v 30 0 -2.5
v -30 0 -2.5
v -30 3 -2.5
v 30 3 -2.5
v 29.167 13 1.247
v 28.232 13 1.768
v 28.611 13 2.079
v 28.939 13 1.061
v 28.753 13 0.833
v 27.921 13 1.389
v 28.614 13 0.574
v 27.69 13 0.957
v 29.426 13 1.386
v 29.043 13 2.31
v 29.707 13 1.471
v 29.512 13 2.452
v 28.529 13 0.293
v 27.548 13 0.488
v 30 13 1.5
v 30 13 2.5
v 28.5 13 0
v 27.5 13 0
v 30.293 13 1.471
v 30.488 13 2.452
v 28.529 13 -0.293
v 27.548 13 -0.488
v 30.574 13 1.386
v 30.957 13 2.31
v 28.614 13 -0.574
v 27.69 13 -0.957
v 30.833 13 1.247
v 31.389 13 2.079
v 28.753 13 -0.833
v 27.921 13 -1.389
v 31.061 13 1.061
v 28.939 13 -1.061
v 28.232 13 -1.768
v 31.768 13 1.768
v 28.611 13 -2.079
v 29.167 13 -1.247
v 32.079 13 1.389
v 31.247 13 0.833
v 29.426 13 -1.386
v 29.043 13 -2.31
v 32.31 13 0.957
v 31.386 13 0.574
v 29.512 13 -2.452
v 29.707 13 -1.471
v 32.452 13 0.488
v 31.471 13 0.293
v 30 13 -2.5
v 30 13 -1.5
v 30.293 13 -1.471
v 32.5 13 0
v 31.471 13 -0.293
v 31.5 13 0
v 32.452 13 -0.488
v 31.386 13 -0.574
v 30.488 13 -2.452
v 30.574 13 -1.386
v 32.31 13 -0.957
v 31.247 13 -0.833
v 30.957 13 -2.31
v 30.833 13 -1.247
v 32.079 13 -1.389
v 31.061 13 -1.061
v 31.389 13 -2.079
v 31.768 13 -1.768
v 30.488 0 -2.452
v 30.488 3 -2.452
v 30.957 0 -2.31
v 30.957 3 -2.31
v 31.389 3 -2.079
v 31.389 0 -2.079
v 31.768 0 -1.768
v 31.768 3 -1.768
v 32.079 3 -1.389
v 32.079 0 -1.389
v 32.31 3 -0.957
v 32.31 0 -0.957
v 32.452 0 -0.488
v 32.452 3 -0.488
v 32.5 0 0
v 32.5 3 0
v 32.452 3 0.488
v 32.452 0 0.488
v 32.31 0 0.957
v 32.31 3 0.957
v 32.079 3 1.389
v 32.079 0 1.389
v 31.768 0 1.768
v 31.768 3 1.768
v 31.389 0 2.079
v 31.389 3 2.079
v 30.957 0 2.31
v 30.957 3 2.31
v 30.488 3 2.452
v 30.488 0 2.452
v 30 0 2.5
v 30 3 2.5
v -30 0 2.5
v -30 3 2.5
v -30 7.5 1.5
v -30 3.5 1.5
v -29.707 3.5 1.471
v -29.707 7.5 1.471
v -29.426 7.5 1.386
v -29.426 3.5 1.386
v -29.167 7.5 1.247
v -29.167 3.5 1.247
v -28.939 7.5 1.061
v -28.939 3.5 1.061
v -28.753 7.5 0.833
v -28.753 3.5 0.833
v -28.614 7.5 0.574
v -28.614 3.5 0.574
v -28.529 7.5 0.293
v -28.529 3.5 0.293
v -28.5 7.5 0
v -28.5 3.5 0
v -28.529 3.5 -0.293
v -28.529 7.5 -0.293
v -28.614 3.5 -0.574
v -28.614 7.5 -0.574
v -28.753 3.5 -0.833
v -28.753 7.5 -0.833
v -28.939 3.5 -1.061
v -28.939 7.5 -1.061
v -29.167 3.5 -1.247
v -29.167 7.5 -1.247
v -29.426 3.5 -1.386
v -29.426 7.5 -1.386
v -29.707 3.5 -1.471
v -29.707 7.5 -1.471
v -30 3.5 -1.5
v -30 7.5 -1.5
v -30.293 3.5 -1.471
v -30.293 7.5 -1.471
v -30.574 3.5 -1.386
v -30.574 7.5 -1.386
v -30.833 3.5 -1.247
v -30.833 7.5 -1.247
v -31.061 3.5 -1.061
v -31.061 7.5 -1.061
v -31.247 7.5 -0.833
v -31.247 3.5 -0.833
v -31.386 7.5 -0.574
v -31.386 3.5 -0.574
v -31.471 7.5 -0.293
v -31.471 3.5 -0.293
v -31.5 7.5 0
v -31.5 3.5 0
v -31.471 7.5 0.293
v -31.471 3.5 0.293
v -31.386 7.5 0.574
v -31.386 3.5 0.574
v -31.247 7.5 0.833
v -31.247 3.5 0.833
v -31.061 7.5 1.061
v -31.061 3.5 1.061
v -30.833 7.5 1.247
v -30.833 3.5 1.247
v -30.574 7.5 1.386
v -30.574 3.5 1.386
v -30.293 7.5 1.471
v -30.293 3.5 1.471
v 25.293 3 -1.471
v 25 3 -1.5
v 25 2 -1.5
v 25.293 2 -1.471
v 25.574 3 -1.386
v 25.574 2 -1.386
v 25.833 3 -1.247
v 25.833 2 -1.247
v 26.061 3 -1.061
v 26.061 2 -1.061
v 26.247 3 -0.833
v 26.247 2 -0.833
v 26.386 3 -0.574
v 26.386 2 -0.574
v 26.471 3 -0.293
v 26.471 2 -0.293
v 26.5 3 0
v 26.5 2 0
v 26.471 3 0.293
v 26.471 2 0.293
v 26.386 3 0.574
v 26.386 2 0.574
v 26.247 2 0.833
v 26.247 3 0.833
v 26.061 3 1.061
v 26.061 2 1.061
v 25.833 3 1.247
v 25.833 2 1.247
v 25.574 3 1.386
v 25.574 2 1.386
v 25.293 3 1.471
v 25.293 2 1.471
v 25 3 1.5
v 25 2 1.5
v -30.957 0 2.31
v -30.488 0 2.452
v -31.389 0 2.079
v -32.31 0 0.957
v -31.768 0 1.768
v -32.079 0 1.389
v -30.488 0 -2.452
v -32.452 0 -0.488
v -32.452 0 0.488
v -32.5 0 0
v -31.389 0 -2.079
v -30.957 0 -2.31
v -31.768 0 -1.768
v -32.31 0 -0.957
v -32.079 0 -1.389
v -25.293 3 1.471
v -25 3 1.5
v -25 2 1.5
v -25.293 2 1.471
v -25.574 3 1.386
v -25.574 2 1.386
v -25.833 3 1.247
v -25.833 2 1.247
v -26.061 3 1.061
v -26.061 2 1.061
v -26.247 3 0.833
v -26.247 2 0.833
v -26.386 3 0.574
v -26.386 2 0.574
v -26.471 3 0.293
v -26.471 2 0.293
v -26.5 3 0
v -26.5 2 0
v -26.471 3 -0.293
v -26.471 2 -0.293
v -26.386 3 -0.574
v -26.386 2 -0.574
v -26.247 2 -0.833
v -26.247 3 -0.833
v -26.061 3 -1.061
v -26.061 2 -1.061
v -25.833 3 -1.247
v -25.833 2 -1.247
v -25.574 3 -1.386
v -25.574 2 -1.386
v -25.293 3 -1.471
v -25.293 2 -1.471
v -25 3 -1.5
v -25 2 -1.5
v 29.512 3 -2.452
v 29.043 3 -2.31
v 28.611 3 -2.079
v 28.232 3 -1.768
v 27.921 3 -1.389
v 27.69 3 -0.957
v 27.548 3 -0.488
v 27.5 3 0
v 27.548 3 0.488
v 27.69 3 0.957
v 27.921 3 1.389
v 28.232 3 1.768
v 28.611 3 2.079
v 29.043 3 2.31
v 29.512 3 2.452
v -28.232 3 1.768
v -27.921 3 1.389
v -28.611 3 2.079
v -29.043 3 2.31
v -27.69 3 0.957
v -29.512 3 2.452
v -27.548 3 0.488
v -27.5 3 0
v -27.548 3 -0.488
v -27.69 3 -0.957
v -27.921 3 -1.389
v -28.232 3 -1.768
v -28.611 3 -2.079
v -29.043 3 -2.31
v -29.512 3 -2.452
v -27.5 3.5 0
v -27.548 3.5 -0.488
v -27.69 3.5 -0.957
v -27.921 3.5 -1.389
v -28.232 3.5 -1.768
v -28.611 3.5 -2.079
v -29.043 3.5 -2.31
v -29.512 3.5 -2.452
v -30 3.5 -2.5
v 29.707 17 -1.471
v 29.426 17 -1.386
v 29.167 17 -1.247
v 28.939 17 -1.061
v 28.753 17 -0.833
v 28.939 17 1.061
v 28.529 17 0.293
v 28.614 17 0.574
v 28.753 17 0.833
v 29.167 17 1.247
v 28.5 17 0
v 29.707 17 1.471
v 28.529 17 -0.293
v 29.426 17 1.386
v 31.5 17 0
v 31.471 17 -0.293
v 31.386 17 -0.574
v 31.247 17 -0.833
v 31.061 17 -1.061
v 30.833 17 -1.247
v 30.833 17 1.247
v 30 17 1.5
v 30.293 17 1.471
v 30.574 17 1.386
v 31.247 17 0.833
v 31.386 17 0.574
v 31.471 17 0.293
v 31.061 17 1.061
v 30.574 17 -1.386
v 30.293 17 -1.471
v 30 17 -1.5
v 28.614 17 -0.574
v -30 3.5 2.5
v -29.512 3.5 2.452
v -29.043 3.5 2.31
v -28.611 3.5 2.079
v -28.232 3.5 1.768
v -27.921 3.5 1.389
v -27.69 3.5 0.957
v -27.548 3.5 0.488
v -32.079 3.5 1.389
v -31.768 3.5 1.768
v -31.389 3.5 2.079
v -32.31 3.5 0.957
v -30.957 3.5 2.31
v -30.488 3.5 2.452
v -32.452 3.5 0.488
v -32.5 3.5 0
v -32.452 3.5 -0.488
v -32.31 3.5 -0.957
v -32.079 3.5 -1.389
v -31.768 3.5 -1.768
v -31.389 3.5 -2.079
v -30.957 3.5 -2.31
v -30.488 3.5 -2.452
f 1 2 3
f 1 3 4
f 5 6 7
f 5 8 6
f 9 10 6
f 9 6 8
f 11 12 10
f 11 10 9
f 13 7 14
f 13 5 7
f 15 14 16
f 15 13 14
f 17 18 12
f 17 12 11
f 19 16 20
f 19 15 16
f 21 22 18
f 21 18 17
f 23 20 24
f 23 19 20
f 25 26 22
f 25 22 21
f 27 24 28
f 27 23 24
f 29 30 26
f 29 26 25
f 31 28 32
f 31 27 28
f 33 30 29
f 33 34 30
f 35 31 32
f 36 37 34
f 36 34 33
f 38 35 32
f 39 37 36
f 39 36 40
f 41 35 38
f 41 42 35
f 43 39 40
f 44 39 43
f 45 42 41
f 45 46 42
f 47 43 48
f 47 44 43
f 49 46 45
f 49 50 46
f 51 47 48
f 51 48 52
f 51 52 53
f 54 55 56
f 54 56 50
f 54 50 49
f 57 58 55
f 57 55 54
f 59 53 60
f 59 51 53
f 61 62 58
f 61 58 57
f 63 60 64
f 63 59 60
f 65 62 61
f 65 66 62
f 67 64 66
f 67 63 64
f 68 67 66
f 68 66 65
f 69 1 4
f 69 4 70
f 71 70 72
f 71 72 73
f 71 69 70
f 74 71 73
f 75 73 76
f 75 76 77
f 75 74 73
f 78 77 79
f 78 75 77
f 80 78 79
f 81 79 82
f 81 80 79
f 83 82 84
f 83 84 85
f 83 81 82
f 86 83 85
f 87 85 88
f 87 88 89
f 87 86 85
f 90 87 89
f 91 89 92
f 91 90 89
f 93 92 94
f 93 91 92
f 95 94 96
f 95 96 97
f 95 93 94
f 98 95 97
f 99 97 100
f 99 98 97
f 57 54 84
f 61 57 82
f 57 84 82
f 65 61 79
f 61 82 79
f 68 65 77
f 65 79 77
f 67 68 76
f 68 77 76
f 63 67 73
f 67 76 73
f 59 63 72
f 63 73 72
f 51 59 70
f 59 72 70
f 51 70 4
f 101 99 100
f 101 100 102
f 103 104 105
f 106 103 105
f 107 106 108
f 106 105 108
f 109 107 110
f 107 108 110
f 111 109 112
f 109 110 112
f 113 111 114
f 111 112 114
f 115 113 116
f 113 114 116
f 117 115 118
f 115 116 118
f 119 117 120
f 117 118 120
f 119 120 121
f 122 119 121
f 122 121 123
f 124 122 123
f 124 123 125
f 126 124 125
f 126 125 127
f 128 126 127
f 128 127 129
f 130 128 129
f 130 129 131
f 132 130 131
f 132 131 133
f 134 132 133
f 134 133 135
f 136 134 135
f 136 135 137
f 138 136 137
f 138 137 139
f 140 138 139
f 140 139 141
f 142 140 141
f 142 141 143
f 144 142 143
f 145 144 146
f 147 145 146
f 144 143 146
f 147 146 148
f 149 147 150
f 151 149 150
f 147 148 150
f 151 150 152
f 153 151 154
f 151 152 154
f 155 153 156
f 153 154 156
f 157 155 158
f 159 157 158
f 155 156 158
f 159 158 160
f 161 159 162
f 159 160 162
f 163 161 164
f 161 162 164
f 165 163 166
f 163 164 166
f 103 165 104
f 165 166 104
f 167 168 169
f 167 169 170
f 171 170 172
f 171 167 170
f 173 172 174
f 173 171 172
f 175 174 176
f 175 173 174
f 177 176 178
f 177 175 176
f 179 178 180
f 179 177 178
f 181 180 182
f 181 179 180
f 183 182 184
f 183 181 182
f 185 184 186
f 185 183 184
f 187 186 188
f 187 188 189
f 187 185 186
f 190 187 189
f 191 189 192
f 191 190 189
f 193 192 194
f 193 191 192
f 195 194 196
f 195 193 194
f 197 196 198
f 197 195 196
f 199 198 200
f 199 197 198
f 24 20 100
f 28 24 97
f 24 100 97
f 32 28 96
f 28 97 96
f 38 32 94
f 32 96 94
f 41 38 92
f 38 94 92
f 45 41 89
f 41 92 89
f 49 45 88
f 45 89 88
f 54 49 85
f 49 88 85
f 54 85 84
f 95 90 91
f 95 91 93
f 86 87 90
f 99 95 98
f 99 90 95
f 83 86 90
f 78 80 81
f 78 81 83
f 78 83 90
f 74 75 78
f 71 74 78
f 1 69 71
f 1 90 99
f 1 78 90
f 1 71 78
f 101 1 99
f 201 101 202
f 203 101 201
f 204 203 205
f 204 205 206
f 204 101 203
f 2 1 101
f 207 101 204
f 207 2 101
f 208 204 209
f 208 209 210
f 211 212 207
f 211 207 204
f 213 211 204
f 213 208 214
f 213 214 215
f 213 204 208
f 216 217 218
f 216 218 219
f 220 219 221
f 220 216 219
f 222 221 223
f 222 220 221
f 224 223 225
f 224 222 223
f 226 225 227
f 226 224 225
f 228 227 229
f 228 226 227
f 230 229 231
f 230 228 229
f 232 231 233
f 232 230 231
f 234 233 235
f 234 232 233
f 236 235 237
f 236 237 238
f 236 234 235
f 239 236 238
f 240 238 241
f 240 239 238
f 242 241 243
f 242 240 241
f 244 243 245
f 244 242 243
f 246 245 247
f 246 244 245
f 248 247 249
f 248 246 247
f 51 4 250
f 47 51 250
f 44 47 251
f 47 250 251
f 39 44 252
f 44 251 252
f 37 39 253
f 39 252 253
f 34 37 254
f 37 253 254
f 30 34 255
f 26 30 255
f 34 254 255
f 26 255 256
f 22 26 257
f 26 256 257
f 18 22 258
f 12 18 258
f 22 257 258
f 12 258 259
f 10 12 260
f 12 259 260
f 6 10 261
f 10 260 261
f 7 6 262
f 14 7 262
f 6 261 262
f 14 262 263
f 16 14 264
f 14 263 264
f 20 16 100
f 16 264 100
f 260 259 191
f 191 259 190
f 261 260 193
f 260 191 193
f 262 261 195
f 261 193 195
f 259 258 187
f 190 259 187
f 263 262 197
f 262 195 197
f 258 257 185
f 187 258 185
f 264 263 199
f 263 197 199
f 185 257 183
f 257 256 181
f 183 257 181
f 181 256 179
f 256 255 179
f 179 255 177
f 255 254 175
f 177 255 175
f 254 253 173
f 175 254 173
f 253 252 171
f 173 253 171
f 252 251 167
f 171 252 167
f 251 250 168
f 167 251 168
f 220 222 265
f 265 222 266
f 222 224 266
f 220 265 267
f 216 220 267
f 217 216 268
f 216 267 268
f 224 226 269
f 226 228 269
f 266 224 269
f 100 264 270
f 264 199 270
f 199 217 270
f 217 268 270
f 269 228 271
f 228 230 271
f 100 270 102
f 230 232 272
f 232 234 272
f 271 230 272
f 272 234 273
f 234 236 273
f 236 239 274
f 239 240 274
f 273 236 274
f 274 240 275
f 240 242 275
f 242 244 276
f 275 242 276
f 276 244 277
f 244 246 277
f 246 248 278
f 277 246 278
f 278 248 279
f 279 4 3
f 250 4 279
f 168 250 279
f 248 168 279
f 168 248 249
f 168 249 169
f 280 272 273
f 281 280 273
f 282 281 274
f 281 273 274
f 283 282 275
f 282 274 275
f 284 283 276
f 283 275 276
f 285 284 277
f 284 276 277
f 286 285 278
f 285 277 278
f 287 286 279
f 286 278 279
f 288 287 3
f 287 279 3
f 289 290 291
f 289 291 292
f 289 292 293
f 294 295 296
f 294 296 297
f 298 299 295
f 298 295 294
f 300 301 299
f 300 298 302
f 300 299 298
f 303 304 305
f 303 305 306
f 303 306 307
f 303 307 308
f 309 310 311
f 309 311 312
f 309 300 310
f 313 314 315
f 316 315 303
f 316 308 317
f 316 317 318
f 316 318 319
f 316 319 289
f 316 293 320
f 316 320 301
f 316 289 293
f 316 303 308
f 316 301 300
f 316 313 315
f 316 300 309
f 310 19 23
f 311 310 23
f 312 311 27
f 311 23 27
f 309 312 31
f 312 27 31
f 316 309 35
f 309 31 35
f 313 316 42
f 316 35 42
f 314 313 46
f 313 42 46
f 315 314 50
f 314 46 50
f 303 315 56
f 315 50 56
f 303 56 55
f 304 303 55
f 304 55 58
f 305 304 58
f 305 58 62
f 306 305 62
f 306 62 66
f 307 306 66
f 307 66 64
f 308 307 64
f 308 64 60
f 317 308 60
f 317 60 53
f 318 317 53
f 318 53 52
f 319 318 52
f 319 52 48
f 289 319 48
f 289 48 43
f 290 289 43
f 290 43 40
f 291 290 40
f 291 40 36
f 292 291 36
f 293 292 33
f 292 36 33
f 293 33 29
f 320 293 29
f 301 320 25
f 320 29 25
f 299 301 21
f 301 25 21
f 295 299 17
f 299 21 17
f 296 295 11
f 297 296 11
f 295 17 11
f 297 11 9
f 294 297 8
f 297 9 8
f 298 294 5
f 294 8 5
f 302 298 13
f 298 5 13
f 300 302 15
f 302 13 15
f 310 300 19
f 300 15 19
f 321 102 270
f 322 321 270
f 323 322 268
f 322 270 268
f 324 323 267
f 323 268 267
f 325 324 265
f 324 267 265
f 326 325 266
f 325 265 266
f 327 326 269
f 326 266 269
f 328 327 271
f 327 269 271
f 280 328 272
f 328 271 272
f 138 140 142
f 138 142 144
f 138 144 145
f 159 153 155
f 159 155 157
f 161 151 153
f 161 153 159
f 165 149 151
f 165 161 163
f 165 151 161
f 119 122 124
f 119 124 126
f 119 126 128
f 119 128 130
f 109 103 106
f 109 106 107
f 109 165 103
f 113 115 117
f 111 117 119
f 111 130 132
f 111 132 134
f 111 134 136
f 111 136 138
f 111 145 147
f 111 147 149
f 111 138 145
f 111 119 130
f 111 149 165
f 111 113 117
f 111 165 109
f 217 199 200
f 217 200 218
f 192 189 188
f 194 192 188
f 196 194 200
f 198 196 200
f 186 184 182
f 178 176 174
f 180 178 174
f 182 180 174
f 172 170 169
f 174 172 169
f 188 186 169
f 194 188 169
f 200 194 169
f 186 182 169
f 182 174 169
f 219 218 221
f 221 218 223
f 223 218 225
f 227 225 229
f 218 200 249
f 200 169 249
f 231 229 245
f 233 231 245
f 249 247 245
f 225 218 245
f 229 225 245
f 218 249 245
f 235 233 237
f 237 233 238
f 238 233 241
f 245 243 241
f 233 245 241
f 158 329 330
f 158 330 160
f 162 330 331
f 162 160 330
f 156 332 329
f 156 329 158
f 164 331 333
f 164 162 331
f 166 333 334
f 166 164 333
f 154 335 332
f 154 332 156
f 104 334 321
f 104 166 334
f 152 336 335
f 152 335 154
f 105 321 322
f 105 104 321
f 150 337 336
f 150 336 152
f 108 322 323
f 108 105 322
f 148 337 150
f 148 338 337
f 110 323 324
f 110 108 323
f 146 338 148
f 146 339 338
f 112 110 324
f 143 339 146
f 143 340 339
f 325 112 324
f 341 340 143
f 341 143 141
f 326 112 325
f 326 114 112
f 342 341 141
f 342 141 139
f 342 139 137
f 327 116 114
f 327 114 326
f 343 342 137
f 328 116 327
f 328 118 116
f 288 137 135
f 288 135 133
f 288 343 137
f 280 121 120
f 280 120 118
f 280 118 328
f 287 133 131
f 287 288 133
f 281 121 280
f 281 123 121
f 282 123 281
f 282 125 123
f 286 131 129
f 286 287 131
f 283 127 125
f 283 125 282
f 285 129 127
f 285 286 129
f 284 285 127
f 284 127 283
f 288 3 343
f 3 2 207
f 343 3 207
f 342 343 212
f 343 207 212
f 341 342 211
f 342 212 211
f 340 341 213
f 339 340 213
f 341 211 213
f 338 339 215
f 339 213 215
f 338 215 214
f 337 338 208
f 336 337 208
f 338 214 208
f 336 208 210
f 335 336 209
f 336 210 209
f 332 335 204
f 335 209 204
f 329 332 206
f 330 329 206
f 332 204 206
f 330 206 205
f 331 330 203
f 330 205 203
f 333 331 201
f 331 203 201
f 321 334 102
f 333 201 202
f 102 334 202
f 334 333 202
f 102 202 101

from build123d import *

# Parameters (mm, degrees)
EXTRUDE_1_DEPTH     = 3
EXTRUDE_2_DEPTH     = 0.5
SKETCH_3_R          = 1.5
EXTRUDE_3_DEPTH     = 4.5
EXTRUDE_4_DEPTH     = 10
SKETCH_3_3_R        = 1.5
EXTRUDE_5_DEPTH     = 14
CUT_EXTRUDE_1_DEPTH = 1


with BuildPart() as part:
    # Эскиз1 → Бобышка-Вытянуть1 (new body)
    with BuildSketch(Plane(origin=(0, 0, 0), x_dir=(1, 0, 0), z_dir=(0, 1, 0))):
        with BuildLine():
            Line((30, -2.5), (-30, -2.5))
            ThreePointArc((-30, -2.5), (-32.5, 0), (-30, 2.5))
            Line((-30, 2.5), (30, 2.5))
            ThreePointArc((30, 2.5), (32.5, 0), (30, -2.5))
        make_face()
    extrude(amount=EXTRUDE_1_DEPTH)

    # Эскиз2 → Бобышка-Вытянуть2 (add)
    with BuildSketch(Plane(origin=(0, 3, 0), x_dir=(1, 0, 0), z_dir=(0, 1, 0))):
        with BuildLine():
            ThreePointArc((-30, -2.5), (-28.232233047, -1.767766953), (-27.5, 0))
            ThreePointArc((-27.5, 0), (-28.232233047, 1.767766953), (-30, 2.5))
            ThreePointArc((-30, 2.5), (-32.5, 0), (-30, -2.5))
        make_face()
    extrude(amount=EXTRUDE_2_DEPTH)

    # Эскиз3 → Бобышка-Вытянуть3 (add)
    with BuildSketch(Plane(origin=(0, 3, 0), x_dir=(1, 0, 0), z_dir=(0, 1, 0))):
        with Locations(Location((-30, 0, 0), (0, 0, 270))):
            Circle(SKETCH_3_R)
    extrude(amount=EXTRUDE_3_DEPTH)

    # Эскиз2<3> → Бобышка-Вытянуть4 (add)
    with BuildSketch(Plane(origin=(0, 3, 0), x_dir=(1, 0, 0), z_dir=(0, 1, 0))):
        with BuildLine():
            ThreePointArc((30, -2.5), (31.767766953, -1.767766953), (32.5, 0))
            ThreePointArc((32.5, 0), (31.767766953, 1.767766953), (30, 2.5))
            ThreePointArc((30, 2.5), (27.5, 0), (30, -2.5))
        make_face()
    extrude(amount=EXTRUDE_4_DEPTH)

    # Эскиз3<3> → Бобышка-Вытянуть5 (add)
    with BuildSketch(Plane(origin=(0, 3, 0), x_dir=(1, 0, 0), z_dir=(0, 1, 0))):
        with Locations(Location((30, 0, 0), (0, 0, 270))):
            Circle(SKETCH_3_3_R)
    extrude(amount=EXTRUDE_5_DEPTH)

    # Эскиз4 → Вырез-Вытянуть1 (cut)
    with BuildSketch(Plane(origin=(0, 3, 0), x_dir=(1, 0, 0), z_dir=(0, 1, 0))):
        with BuildLine():
            Line((25, -1.5), (-25, -1.5))
            ThreePointArc((-25, -1.5), (-26.5, 0), (-25, 1.5))
            Line((-25, 1.5), (25, 1.5))
            ThreePointArc((25, 1.5), (26.5, 0), (25, -1.5))
        make_face()
    extrude(amount=-CUT_EXTRUDE_1_DEPTH, mode=Mode.SUBTRACT)


solid = part.part
